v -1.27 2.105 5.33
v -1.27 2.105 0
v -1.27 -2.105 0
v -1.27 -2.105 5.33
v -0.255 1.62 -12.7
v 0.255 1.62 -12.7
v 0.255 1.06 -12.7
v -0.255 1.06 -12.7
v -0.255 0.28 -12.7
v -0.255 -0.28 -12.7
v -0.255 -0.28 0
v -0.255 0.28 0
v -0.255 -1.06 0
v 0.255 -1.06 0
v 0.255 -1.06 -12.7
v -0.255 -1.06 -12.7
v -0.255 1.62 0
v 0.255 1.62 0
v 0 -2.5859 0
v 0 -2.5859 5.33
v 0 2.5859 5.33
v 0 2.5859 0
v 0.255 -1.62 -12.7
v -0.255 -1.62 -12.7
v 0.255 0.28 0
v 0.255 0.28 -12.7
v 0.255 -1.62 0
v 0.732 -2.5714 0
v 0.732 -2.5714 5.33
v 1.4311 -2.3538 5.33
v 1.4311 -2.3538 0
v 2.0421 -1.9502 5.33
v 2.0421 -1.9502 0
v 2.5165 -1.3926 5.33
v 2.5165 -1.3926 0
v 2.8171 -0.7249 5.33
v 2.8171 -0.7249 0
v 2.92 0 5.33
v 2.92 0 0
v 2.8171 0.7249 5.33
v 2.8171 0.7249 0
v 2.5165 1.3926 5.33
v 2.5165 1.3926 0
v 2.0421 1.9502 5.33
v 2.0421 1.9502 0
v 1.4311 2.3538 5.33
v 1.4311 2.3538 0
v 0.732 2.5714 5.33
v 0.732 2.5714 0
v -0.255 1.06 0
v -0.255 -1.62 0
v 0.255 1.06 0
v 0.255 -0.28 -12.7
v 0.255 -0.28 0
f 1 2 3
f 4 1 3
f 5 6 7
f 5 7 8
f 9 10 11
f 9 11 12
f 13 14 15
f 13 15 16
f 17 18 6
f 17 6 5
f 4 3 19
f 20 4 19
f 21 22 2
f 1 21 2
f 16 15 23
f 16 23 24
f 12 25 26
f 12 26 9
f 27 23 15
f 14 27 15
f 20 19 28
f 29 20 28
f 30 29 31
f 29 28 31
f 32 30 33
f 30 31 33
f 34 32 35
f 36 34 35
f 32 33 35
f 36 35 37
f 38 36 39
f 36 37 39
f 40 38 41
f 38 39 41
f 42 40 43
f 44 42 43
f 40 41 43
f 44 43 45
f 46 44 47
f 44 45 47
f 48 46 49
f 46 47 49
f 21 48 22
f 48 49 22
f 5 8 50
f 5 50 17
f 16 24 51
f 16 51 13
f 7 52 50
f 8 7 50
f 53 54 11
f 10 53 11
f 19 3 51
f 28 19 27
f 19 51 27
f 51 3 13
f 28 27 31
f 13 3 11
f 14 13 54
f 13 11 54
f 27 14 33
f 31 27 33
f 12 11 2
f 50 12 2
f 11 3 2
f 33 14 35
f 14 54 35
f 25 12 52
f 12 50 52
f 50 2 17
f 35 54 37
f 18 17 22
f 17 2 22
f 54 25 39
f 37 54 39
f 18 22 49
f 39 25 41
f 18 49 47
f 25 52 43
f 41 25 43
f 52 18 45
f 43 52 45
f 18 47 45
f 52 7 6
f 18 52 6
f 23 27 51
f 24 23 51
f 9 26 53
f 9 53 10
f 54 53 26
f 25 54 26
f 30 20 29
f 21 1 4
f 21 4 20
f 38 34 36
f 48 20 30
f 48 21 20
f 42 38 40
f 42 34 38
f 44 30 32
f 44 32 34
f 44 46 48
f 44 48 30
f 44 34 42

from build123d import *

# Parameters (mm, degrees)
BOSS_EXTRU_1_DEPTH = 5.33
ESQUISSE2_W        = 0.51
ESQUISSE2_H        = 0.56
BOSS_EXTRU_2_DEPTH = 12.7


with BuildPart() as part:
    # Esquisse1 → Boss.-Extru.1 (new body)
    with BuildSketch(Plane.XY):
        with BuildLine():
            Line((-1.27, 2.105), (-1.27, -2.105))
            Line((-1.27, -2.105), (0, -2.585884762))
            ThreePointArc((0, -2.585884762), (2.92, 0), (0, 2.585884762))
            Line((0, 2.585884762), (-1.27, 2.105))
        make_face()
    extrude(amount=BOSS_EXTRU_1_DEPTH)

    # Esquisse2 → Boss.-Extru.2 (add)
    with BuildSketch(Plane(origin=(0, 0, 0), x_dir=(-1, 0, 0), z_dir=(0, 0, -1))):
        with Locations((0, 1.34)):
            Rectangle(ESQUISSE2_W, ESQUISSE2_H)
        Rectangle(ESQUISSE2_W, ESQUISSE2_H)
        with Locations((0, -1.34)):
            Rectangle(ESQUISSE2_W, ESQUISSE2_H)
    extrude(amount=BOSS_EXTRU_2_DEPTH)


solid = part.part
